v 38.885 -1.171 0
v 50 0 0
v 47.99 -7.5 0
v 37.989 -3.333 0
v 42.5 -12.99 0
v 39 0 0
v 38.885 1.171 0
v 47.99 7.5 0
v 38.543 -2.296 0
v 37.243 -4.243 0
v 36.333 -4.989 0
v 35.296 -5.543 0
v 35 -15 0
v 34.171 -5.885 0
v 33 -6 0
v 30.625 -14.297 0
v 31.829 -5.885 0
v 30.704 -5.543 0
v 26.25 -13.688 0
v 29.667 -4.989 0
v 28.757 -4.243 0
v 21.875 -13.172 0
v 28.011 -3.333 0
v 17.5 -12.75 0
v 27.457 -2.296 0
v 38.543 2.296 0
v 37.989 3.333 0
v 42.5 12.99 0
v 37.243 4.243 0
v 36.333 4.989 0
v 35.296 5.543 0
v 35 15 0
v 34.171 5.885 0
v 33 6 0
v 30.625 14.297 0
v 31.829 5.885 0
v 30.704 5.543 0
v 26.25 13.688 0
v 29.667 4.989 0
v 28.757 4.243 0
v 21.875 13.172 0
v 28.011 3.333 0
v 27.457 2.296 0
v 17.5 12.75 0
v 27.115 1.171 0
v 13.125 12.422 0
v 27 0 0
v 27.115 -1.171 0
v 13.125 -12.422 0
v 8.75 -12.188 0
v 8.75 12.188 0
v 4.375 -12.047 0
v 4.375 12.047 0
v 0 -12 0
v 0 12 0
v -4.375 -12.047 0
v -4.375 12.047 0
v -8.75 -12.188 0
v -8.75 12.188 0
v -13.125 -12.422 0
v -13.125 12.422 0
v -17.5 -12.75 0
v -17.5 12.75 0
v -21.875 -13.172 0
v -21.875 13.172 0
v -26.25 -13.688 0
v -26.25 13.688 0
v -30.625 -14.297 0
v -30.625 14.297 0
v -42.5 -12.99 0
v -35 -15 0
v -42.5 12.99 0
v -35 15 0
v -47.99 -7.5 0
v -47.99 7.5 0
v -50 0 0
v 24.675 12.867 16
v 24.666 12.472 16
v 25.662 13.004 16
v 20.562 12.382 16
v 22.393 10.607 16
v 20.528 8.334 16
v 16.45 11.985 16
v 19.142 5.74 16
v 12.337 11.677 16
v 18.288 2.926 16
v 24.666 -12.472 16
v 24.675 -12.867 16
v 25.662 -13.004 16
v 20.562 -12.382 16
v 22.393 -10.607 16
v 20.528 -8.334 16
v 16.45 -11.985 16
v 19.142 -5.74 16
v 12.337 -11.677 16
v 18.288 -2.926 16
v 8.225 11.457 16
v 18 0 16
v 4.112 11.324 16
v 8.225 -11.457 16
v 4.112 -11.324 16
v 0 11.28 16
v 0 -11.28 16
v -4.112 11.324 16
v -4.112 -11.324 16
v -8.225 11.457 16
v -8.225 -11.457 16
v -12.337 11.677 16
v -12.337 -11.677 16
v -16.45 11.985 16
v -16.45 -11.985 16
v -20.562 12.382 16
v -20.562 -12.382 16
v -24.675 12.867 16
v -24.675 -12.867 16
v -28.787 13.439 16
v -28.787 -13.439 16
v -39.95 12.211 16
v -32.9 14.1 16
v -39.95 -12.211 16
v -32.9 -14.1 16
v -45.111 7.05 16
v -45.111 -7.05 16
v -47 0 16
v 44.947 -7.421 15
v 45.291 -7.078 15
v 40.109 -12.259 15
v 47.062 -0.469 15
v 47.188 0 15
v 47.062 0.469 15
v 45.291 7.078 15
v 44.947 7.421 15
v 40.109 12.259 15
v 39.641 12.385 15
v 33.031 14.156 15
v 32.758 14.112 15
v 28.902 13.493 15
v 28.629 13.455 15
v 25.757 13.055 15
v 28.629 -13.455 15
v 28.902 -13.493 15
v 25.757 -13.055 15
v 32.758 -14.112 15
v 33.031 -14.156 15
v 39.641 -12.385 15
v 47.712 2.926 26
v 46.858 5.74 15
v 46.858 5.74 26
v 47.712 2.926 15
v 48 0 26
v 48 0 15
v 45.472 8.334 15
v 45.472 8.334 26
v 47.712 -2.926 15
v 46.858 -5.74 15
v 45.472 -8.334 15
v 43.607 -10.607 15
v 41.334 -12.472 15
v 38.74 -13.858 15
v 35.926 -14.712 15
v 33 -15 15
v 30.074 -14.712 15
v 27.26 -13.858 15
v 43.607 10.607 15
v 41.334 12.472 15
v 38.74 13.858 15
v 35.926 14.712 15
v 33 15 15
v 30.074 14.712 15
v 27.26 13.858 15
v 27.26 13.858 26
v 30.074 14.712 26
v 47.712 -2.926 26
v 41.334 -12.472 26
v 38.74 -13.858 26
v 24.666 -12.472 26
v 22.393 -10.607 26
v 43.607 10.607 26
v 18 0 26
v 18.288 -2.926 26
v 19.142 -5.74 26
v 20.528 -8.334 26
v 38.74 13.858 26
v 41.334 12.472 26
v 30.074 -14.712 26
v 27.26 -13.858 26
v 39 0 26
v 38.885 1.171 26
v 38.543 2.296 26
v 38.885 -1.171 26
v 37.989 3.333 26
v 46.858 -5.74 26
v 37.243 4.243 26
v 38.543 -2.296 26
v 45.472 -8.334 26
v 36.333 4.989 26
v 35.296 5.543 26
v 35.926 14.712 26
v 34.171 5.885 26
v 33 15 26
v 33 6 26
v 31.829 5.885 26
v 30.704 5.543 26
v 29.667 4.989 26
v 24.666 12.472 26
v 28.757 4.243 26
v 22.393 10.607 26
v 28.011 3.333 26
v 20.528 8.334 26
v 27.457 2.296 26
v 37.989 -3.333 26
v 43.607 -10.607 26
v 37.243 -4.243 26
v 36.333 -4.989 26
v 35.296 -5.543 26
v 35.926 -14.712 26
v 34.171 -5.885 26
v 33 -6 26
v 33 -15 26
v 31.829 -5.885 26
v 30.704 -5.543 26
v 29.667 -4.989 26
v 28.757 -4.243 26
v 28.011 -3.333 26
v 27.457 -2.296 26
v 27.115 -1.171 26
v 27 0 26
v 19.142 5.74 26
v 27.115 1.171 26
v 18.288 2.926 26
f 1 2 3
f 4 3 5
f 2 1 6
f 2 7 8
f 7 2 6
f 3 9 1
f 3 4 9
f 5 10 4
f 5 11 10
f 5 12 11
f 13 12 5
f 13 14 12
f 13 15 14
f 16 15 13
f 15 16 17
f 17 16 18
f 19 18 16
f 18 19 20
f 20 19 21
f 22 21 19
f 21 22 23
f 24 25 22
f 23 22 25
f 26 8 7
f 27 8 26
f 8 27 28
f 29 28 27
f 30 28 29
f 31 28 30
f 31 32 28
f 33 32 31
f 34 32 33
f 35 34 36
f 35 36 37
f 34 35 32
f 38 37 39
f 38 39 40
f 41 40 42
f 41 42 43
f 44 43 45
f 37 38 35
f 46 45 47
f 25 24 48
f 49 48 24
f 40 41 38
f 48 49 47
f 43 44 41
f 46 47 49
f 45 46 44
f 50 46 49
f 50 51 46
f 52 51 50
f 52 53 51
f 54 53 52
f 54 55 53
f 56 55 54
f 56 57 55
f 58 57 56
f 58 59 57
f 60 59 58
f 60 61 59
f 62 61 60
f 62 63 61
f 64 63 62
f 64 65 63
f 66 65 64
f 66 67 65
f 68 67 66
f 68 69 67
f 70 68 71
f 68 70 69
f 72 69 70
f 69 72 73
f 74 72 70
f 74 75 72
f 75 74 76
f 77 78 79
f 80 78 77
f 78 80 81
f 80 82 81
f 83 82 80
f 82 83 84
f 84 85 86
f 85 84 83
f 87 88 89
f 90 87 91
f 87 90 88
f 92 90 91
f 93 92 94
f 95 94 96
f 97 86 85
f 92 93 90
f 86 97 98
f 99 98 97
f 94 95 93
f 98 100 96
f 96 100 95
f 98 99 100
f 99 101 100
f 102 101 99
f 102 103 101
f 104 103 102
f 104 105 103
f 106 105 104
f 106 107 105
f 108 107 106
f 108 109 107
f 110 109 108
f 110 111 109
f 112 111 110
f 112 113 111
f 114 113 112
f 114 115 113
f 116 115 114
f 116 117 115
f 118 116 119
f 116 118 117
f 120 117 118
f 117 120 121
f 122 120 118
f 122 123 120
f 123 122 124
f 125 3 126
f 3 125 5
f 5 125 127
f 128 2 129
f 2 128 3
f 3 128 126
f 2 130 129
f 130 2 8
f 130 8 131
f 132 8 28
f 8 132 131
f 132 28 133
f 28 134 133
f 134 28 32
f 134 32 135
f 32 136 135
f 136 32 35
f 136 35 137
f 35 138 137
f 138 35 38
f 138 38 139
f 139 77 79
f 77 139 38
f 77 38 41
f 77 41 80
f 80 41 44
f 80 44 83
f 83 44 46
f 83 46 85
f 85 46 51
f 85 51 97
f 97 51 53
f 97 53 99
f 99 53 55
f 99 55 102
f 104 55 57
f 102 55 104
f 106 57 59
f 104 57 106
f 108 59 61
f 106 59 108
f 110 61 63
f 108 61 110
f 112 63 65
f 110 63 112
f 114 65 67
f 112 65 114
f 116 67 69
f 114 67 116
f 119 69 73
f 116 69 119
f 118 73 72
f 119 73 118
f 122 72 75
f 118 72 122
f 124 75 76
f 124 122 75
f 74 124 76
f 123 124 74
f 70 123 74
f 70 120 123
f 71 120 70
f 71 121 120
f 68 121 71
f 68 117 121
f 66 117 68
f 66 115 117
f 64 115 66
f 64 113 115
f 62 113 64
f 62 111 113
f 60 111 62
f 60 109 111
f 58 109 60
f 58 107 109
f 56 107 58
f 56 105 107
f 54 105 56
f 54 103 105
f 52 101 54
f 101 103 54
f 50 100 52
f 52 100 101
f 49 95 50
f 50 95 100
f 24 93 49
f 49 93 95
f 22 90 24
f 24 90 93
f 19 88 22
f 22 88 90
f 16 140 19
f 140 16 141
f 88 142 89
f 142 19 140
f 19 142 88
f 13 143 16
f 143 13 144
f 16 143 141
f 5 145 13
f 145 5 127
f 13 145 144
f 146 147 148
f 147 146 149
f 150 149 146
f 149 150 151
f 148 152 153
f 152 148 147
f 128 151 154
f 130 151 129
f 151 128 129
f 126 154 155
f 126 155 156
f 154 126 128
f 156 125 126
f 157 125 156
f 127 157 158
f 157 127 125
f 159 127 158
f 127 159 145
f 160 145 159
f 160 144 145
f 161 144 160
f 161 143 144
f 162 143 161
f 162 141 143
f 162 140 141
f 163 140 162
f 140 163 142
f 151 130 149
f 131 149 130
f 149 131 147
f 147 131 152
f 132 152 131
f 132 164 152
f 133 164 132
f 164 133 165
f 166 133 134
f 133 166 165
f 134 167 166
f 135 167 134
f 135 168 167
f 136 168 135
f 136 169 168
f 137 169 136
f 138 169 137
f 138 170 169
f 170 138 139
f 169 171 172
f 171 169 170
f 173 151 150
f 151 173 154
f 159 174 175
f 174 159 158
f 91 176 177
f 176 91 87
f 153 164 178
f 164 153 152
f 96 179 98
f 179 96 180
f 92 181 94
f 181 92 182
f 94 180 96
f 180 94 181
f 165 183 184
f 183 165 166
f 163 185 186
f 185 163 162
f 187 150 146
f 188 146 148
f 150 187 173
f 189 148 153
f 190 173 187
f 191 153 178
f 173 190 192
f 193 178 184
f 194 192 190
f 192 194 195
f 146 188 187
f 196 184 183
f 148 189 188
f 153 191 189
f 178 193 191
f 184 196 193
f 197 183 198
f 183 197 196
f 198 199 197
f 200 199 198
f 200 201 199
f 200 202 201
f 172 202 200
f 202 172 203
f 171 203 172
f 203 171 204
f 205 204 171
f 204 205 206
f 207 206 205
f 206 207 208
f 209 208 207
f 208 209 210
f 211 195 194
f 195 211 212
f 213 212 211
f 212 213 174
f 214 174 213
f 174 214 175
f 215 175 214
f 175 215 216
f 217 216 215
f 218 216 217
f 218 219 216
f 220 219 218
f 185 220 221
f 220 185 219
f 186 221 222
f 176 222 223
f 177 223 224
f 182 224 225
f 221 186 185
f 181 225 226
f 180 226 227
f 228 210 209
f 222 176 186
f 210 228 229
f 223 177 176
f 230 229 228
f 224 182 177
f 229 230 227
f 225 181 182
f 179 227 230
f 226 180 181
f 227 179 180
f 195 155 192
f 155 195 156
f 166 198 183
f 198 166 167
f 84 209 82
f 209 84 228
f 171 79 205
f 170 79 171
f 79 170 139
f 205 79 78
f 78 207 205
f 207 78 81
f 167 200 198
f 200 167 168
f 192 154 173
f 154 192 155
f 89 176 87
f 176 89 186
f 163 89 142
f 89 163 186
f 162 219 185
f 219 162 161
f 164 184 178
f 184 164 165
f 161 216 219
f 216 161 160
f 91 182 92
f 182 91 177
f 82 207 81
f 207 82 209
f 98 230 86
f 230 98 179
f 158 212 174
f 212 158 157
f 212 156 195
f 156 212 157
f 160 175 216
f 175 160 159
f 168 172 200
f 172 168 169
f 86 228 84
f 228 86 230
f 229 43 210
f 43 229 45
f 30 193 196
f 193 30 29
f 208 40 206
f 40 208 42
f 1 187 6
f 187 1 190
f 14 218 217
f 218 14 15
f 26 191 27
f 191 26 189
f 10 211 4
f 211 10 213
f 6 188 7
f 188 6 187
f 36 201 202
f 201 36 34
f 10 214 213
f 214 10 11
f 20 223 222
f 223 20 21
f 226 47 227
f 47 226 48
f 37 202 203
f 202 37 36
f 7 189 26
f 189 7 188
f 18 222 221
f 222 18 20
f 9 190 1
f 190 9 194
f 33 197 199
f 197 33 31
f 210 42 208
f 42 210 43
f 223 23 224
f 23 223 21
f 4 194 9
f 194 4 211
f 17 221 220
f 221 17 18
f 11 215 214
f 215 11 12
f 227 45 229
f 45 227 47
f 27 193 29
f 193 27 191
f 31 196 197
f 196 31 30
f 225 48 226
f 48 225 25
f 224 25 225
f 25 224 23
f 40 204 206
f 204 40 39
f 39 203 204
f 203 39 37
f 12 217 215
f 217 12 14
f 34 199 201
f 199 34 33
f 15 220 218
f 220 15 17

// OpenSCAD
$fn = 32;

// ----------------------------------------------------------------------
// Handle: 100 x 30 mm grip, 16 mm thick
// ----------------------------------------------------------------------

// --- parameters (mm) ---
length = 100;             // grip length
width = 30;               // grip width
thickness = 16;           // grip thickness
waist = 0.8;              // width factor at the middle
draft = 0.94;             // top face scale of the extrusion
boss_d = 30;              // mounting boss diameter
boss_h = 10;              // mounting boss height
boss_hole_d = 12;         // screw clearance through the boss
boss_r = 33;              // boss centre from the grip centre

/* ergonomic grip outline, closed spline-like polygon in the XY plane */
grip = [[-35, 15], [-30.625, 14.297], [-26.25, 13.688], [-21.875, 13.172], [-17.5, 12.75], [-13.125, 12.422], [-8.75, 12.188], [-4.375, 12.047], [0, 12], [4.375, 12.047], [8.75, 12.188], [13.125, 12.422], [17.5, 12.75], [21.875, 13.172], [26.25, 13.688], [30.625, 14.297], [35, 15], [42.5, 12.99], [47.99, 7.5], [50, 0], [47.99, -7.5], [42.5, -12.99], [35, -15], [35, -15], [30.625, -14.297], [26.25, -13.688], [21.875, -13.172], [17.5, -12.75], [13.125, -12.422], [8.75, -12.188], [4.375, -12.047], [0, -12], [-4.375, -12.047], [-8.75, -12.188], [-13.125, -12.422], [-17.5, -12.75], [-21.875, -13.172], [-26.25, -13.688], [-30.625, -14.297], [-35, -15], [-42.5, -12.99], [-47.99, -7.5], [-50, 0], [-47.99, 7.5], [-42.5, 12.99], [-35, 15]];

module grip_body() {
  linear_extrude(height = thickness, scale = draft) polygon(grip);
}

module boss_body() {
  /* sunk 1 mm into the grip so the joint overlaps */
  translate([boss_r, 0, thickness - 1]) cylinder(h = boss_h + 1, d = boss_d);
}

difference() {
  union() {
    grip_body();
    boss_body();
  }
  translate([boss_r, 0, -1]) cylinder(h = thickness + boss_h + 2, d = boss_hole_d);
}
